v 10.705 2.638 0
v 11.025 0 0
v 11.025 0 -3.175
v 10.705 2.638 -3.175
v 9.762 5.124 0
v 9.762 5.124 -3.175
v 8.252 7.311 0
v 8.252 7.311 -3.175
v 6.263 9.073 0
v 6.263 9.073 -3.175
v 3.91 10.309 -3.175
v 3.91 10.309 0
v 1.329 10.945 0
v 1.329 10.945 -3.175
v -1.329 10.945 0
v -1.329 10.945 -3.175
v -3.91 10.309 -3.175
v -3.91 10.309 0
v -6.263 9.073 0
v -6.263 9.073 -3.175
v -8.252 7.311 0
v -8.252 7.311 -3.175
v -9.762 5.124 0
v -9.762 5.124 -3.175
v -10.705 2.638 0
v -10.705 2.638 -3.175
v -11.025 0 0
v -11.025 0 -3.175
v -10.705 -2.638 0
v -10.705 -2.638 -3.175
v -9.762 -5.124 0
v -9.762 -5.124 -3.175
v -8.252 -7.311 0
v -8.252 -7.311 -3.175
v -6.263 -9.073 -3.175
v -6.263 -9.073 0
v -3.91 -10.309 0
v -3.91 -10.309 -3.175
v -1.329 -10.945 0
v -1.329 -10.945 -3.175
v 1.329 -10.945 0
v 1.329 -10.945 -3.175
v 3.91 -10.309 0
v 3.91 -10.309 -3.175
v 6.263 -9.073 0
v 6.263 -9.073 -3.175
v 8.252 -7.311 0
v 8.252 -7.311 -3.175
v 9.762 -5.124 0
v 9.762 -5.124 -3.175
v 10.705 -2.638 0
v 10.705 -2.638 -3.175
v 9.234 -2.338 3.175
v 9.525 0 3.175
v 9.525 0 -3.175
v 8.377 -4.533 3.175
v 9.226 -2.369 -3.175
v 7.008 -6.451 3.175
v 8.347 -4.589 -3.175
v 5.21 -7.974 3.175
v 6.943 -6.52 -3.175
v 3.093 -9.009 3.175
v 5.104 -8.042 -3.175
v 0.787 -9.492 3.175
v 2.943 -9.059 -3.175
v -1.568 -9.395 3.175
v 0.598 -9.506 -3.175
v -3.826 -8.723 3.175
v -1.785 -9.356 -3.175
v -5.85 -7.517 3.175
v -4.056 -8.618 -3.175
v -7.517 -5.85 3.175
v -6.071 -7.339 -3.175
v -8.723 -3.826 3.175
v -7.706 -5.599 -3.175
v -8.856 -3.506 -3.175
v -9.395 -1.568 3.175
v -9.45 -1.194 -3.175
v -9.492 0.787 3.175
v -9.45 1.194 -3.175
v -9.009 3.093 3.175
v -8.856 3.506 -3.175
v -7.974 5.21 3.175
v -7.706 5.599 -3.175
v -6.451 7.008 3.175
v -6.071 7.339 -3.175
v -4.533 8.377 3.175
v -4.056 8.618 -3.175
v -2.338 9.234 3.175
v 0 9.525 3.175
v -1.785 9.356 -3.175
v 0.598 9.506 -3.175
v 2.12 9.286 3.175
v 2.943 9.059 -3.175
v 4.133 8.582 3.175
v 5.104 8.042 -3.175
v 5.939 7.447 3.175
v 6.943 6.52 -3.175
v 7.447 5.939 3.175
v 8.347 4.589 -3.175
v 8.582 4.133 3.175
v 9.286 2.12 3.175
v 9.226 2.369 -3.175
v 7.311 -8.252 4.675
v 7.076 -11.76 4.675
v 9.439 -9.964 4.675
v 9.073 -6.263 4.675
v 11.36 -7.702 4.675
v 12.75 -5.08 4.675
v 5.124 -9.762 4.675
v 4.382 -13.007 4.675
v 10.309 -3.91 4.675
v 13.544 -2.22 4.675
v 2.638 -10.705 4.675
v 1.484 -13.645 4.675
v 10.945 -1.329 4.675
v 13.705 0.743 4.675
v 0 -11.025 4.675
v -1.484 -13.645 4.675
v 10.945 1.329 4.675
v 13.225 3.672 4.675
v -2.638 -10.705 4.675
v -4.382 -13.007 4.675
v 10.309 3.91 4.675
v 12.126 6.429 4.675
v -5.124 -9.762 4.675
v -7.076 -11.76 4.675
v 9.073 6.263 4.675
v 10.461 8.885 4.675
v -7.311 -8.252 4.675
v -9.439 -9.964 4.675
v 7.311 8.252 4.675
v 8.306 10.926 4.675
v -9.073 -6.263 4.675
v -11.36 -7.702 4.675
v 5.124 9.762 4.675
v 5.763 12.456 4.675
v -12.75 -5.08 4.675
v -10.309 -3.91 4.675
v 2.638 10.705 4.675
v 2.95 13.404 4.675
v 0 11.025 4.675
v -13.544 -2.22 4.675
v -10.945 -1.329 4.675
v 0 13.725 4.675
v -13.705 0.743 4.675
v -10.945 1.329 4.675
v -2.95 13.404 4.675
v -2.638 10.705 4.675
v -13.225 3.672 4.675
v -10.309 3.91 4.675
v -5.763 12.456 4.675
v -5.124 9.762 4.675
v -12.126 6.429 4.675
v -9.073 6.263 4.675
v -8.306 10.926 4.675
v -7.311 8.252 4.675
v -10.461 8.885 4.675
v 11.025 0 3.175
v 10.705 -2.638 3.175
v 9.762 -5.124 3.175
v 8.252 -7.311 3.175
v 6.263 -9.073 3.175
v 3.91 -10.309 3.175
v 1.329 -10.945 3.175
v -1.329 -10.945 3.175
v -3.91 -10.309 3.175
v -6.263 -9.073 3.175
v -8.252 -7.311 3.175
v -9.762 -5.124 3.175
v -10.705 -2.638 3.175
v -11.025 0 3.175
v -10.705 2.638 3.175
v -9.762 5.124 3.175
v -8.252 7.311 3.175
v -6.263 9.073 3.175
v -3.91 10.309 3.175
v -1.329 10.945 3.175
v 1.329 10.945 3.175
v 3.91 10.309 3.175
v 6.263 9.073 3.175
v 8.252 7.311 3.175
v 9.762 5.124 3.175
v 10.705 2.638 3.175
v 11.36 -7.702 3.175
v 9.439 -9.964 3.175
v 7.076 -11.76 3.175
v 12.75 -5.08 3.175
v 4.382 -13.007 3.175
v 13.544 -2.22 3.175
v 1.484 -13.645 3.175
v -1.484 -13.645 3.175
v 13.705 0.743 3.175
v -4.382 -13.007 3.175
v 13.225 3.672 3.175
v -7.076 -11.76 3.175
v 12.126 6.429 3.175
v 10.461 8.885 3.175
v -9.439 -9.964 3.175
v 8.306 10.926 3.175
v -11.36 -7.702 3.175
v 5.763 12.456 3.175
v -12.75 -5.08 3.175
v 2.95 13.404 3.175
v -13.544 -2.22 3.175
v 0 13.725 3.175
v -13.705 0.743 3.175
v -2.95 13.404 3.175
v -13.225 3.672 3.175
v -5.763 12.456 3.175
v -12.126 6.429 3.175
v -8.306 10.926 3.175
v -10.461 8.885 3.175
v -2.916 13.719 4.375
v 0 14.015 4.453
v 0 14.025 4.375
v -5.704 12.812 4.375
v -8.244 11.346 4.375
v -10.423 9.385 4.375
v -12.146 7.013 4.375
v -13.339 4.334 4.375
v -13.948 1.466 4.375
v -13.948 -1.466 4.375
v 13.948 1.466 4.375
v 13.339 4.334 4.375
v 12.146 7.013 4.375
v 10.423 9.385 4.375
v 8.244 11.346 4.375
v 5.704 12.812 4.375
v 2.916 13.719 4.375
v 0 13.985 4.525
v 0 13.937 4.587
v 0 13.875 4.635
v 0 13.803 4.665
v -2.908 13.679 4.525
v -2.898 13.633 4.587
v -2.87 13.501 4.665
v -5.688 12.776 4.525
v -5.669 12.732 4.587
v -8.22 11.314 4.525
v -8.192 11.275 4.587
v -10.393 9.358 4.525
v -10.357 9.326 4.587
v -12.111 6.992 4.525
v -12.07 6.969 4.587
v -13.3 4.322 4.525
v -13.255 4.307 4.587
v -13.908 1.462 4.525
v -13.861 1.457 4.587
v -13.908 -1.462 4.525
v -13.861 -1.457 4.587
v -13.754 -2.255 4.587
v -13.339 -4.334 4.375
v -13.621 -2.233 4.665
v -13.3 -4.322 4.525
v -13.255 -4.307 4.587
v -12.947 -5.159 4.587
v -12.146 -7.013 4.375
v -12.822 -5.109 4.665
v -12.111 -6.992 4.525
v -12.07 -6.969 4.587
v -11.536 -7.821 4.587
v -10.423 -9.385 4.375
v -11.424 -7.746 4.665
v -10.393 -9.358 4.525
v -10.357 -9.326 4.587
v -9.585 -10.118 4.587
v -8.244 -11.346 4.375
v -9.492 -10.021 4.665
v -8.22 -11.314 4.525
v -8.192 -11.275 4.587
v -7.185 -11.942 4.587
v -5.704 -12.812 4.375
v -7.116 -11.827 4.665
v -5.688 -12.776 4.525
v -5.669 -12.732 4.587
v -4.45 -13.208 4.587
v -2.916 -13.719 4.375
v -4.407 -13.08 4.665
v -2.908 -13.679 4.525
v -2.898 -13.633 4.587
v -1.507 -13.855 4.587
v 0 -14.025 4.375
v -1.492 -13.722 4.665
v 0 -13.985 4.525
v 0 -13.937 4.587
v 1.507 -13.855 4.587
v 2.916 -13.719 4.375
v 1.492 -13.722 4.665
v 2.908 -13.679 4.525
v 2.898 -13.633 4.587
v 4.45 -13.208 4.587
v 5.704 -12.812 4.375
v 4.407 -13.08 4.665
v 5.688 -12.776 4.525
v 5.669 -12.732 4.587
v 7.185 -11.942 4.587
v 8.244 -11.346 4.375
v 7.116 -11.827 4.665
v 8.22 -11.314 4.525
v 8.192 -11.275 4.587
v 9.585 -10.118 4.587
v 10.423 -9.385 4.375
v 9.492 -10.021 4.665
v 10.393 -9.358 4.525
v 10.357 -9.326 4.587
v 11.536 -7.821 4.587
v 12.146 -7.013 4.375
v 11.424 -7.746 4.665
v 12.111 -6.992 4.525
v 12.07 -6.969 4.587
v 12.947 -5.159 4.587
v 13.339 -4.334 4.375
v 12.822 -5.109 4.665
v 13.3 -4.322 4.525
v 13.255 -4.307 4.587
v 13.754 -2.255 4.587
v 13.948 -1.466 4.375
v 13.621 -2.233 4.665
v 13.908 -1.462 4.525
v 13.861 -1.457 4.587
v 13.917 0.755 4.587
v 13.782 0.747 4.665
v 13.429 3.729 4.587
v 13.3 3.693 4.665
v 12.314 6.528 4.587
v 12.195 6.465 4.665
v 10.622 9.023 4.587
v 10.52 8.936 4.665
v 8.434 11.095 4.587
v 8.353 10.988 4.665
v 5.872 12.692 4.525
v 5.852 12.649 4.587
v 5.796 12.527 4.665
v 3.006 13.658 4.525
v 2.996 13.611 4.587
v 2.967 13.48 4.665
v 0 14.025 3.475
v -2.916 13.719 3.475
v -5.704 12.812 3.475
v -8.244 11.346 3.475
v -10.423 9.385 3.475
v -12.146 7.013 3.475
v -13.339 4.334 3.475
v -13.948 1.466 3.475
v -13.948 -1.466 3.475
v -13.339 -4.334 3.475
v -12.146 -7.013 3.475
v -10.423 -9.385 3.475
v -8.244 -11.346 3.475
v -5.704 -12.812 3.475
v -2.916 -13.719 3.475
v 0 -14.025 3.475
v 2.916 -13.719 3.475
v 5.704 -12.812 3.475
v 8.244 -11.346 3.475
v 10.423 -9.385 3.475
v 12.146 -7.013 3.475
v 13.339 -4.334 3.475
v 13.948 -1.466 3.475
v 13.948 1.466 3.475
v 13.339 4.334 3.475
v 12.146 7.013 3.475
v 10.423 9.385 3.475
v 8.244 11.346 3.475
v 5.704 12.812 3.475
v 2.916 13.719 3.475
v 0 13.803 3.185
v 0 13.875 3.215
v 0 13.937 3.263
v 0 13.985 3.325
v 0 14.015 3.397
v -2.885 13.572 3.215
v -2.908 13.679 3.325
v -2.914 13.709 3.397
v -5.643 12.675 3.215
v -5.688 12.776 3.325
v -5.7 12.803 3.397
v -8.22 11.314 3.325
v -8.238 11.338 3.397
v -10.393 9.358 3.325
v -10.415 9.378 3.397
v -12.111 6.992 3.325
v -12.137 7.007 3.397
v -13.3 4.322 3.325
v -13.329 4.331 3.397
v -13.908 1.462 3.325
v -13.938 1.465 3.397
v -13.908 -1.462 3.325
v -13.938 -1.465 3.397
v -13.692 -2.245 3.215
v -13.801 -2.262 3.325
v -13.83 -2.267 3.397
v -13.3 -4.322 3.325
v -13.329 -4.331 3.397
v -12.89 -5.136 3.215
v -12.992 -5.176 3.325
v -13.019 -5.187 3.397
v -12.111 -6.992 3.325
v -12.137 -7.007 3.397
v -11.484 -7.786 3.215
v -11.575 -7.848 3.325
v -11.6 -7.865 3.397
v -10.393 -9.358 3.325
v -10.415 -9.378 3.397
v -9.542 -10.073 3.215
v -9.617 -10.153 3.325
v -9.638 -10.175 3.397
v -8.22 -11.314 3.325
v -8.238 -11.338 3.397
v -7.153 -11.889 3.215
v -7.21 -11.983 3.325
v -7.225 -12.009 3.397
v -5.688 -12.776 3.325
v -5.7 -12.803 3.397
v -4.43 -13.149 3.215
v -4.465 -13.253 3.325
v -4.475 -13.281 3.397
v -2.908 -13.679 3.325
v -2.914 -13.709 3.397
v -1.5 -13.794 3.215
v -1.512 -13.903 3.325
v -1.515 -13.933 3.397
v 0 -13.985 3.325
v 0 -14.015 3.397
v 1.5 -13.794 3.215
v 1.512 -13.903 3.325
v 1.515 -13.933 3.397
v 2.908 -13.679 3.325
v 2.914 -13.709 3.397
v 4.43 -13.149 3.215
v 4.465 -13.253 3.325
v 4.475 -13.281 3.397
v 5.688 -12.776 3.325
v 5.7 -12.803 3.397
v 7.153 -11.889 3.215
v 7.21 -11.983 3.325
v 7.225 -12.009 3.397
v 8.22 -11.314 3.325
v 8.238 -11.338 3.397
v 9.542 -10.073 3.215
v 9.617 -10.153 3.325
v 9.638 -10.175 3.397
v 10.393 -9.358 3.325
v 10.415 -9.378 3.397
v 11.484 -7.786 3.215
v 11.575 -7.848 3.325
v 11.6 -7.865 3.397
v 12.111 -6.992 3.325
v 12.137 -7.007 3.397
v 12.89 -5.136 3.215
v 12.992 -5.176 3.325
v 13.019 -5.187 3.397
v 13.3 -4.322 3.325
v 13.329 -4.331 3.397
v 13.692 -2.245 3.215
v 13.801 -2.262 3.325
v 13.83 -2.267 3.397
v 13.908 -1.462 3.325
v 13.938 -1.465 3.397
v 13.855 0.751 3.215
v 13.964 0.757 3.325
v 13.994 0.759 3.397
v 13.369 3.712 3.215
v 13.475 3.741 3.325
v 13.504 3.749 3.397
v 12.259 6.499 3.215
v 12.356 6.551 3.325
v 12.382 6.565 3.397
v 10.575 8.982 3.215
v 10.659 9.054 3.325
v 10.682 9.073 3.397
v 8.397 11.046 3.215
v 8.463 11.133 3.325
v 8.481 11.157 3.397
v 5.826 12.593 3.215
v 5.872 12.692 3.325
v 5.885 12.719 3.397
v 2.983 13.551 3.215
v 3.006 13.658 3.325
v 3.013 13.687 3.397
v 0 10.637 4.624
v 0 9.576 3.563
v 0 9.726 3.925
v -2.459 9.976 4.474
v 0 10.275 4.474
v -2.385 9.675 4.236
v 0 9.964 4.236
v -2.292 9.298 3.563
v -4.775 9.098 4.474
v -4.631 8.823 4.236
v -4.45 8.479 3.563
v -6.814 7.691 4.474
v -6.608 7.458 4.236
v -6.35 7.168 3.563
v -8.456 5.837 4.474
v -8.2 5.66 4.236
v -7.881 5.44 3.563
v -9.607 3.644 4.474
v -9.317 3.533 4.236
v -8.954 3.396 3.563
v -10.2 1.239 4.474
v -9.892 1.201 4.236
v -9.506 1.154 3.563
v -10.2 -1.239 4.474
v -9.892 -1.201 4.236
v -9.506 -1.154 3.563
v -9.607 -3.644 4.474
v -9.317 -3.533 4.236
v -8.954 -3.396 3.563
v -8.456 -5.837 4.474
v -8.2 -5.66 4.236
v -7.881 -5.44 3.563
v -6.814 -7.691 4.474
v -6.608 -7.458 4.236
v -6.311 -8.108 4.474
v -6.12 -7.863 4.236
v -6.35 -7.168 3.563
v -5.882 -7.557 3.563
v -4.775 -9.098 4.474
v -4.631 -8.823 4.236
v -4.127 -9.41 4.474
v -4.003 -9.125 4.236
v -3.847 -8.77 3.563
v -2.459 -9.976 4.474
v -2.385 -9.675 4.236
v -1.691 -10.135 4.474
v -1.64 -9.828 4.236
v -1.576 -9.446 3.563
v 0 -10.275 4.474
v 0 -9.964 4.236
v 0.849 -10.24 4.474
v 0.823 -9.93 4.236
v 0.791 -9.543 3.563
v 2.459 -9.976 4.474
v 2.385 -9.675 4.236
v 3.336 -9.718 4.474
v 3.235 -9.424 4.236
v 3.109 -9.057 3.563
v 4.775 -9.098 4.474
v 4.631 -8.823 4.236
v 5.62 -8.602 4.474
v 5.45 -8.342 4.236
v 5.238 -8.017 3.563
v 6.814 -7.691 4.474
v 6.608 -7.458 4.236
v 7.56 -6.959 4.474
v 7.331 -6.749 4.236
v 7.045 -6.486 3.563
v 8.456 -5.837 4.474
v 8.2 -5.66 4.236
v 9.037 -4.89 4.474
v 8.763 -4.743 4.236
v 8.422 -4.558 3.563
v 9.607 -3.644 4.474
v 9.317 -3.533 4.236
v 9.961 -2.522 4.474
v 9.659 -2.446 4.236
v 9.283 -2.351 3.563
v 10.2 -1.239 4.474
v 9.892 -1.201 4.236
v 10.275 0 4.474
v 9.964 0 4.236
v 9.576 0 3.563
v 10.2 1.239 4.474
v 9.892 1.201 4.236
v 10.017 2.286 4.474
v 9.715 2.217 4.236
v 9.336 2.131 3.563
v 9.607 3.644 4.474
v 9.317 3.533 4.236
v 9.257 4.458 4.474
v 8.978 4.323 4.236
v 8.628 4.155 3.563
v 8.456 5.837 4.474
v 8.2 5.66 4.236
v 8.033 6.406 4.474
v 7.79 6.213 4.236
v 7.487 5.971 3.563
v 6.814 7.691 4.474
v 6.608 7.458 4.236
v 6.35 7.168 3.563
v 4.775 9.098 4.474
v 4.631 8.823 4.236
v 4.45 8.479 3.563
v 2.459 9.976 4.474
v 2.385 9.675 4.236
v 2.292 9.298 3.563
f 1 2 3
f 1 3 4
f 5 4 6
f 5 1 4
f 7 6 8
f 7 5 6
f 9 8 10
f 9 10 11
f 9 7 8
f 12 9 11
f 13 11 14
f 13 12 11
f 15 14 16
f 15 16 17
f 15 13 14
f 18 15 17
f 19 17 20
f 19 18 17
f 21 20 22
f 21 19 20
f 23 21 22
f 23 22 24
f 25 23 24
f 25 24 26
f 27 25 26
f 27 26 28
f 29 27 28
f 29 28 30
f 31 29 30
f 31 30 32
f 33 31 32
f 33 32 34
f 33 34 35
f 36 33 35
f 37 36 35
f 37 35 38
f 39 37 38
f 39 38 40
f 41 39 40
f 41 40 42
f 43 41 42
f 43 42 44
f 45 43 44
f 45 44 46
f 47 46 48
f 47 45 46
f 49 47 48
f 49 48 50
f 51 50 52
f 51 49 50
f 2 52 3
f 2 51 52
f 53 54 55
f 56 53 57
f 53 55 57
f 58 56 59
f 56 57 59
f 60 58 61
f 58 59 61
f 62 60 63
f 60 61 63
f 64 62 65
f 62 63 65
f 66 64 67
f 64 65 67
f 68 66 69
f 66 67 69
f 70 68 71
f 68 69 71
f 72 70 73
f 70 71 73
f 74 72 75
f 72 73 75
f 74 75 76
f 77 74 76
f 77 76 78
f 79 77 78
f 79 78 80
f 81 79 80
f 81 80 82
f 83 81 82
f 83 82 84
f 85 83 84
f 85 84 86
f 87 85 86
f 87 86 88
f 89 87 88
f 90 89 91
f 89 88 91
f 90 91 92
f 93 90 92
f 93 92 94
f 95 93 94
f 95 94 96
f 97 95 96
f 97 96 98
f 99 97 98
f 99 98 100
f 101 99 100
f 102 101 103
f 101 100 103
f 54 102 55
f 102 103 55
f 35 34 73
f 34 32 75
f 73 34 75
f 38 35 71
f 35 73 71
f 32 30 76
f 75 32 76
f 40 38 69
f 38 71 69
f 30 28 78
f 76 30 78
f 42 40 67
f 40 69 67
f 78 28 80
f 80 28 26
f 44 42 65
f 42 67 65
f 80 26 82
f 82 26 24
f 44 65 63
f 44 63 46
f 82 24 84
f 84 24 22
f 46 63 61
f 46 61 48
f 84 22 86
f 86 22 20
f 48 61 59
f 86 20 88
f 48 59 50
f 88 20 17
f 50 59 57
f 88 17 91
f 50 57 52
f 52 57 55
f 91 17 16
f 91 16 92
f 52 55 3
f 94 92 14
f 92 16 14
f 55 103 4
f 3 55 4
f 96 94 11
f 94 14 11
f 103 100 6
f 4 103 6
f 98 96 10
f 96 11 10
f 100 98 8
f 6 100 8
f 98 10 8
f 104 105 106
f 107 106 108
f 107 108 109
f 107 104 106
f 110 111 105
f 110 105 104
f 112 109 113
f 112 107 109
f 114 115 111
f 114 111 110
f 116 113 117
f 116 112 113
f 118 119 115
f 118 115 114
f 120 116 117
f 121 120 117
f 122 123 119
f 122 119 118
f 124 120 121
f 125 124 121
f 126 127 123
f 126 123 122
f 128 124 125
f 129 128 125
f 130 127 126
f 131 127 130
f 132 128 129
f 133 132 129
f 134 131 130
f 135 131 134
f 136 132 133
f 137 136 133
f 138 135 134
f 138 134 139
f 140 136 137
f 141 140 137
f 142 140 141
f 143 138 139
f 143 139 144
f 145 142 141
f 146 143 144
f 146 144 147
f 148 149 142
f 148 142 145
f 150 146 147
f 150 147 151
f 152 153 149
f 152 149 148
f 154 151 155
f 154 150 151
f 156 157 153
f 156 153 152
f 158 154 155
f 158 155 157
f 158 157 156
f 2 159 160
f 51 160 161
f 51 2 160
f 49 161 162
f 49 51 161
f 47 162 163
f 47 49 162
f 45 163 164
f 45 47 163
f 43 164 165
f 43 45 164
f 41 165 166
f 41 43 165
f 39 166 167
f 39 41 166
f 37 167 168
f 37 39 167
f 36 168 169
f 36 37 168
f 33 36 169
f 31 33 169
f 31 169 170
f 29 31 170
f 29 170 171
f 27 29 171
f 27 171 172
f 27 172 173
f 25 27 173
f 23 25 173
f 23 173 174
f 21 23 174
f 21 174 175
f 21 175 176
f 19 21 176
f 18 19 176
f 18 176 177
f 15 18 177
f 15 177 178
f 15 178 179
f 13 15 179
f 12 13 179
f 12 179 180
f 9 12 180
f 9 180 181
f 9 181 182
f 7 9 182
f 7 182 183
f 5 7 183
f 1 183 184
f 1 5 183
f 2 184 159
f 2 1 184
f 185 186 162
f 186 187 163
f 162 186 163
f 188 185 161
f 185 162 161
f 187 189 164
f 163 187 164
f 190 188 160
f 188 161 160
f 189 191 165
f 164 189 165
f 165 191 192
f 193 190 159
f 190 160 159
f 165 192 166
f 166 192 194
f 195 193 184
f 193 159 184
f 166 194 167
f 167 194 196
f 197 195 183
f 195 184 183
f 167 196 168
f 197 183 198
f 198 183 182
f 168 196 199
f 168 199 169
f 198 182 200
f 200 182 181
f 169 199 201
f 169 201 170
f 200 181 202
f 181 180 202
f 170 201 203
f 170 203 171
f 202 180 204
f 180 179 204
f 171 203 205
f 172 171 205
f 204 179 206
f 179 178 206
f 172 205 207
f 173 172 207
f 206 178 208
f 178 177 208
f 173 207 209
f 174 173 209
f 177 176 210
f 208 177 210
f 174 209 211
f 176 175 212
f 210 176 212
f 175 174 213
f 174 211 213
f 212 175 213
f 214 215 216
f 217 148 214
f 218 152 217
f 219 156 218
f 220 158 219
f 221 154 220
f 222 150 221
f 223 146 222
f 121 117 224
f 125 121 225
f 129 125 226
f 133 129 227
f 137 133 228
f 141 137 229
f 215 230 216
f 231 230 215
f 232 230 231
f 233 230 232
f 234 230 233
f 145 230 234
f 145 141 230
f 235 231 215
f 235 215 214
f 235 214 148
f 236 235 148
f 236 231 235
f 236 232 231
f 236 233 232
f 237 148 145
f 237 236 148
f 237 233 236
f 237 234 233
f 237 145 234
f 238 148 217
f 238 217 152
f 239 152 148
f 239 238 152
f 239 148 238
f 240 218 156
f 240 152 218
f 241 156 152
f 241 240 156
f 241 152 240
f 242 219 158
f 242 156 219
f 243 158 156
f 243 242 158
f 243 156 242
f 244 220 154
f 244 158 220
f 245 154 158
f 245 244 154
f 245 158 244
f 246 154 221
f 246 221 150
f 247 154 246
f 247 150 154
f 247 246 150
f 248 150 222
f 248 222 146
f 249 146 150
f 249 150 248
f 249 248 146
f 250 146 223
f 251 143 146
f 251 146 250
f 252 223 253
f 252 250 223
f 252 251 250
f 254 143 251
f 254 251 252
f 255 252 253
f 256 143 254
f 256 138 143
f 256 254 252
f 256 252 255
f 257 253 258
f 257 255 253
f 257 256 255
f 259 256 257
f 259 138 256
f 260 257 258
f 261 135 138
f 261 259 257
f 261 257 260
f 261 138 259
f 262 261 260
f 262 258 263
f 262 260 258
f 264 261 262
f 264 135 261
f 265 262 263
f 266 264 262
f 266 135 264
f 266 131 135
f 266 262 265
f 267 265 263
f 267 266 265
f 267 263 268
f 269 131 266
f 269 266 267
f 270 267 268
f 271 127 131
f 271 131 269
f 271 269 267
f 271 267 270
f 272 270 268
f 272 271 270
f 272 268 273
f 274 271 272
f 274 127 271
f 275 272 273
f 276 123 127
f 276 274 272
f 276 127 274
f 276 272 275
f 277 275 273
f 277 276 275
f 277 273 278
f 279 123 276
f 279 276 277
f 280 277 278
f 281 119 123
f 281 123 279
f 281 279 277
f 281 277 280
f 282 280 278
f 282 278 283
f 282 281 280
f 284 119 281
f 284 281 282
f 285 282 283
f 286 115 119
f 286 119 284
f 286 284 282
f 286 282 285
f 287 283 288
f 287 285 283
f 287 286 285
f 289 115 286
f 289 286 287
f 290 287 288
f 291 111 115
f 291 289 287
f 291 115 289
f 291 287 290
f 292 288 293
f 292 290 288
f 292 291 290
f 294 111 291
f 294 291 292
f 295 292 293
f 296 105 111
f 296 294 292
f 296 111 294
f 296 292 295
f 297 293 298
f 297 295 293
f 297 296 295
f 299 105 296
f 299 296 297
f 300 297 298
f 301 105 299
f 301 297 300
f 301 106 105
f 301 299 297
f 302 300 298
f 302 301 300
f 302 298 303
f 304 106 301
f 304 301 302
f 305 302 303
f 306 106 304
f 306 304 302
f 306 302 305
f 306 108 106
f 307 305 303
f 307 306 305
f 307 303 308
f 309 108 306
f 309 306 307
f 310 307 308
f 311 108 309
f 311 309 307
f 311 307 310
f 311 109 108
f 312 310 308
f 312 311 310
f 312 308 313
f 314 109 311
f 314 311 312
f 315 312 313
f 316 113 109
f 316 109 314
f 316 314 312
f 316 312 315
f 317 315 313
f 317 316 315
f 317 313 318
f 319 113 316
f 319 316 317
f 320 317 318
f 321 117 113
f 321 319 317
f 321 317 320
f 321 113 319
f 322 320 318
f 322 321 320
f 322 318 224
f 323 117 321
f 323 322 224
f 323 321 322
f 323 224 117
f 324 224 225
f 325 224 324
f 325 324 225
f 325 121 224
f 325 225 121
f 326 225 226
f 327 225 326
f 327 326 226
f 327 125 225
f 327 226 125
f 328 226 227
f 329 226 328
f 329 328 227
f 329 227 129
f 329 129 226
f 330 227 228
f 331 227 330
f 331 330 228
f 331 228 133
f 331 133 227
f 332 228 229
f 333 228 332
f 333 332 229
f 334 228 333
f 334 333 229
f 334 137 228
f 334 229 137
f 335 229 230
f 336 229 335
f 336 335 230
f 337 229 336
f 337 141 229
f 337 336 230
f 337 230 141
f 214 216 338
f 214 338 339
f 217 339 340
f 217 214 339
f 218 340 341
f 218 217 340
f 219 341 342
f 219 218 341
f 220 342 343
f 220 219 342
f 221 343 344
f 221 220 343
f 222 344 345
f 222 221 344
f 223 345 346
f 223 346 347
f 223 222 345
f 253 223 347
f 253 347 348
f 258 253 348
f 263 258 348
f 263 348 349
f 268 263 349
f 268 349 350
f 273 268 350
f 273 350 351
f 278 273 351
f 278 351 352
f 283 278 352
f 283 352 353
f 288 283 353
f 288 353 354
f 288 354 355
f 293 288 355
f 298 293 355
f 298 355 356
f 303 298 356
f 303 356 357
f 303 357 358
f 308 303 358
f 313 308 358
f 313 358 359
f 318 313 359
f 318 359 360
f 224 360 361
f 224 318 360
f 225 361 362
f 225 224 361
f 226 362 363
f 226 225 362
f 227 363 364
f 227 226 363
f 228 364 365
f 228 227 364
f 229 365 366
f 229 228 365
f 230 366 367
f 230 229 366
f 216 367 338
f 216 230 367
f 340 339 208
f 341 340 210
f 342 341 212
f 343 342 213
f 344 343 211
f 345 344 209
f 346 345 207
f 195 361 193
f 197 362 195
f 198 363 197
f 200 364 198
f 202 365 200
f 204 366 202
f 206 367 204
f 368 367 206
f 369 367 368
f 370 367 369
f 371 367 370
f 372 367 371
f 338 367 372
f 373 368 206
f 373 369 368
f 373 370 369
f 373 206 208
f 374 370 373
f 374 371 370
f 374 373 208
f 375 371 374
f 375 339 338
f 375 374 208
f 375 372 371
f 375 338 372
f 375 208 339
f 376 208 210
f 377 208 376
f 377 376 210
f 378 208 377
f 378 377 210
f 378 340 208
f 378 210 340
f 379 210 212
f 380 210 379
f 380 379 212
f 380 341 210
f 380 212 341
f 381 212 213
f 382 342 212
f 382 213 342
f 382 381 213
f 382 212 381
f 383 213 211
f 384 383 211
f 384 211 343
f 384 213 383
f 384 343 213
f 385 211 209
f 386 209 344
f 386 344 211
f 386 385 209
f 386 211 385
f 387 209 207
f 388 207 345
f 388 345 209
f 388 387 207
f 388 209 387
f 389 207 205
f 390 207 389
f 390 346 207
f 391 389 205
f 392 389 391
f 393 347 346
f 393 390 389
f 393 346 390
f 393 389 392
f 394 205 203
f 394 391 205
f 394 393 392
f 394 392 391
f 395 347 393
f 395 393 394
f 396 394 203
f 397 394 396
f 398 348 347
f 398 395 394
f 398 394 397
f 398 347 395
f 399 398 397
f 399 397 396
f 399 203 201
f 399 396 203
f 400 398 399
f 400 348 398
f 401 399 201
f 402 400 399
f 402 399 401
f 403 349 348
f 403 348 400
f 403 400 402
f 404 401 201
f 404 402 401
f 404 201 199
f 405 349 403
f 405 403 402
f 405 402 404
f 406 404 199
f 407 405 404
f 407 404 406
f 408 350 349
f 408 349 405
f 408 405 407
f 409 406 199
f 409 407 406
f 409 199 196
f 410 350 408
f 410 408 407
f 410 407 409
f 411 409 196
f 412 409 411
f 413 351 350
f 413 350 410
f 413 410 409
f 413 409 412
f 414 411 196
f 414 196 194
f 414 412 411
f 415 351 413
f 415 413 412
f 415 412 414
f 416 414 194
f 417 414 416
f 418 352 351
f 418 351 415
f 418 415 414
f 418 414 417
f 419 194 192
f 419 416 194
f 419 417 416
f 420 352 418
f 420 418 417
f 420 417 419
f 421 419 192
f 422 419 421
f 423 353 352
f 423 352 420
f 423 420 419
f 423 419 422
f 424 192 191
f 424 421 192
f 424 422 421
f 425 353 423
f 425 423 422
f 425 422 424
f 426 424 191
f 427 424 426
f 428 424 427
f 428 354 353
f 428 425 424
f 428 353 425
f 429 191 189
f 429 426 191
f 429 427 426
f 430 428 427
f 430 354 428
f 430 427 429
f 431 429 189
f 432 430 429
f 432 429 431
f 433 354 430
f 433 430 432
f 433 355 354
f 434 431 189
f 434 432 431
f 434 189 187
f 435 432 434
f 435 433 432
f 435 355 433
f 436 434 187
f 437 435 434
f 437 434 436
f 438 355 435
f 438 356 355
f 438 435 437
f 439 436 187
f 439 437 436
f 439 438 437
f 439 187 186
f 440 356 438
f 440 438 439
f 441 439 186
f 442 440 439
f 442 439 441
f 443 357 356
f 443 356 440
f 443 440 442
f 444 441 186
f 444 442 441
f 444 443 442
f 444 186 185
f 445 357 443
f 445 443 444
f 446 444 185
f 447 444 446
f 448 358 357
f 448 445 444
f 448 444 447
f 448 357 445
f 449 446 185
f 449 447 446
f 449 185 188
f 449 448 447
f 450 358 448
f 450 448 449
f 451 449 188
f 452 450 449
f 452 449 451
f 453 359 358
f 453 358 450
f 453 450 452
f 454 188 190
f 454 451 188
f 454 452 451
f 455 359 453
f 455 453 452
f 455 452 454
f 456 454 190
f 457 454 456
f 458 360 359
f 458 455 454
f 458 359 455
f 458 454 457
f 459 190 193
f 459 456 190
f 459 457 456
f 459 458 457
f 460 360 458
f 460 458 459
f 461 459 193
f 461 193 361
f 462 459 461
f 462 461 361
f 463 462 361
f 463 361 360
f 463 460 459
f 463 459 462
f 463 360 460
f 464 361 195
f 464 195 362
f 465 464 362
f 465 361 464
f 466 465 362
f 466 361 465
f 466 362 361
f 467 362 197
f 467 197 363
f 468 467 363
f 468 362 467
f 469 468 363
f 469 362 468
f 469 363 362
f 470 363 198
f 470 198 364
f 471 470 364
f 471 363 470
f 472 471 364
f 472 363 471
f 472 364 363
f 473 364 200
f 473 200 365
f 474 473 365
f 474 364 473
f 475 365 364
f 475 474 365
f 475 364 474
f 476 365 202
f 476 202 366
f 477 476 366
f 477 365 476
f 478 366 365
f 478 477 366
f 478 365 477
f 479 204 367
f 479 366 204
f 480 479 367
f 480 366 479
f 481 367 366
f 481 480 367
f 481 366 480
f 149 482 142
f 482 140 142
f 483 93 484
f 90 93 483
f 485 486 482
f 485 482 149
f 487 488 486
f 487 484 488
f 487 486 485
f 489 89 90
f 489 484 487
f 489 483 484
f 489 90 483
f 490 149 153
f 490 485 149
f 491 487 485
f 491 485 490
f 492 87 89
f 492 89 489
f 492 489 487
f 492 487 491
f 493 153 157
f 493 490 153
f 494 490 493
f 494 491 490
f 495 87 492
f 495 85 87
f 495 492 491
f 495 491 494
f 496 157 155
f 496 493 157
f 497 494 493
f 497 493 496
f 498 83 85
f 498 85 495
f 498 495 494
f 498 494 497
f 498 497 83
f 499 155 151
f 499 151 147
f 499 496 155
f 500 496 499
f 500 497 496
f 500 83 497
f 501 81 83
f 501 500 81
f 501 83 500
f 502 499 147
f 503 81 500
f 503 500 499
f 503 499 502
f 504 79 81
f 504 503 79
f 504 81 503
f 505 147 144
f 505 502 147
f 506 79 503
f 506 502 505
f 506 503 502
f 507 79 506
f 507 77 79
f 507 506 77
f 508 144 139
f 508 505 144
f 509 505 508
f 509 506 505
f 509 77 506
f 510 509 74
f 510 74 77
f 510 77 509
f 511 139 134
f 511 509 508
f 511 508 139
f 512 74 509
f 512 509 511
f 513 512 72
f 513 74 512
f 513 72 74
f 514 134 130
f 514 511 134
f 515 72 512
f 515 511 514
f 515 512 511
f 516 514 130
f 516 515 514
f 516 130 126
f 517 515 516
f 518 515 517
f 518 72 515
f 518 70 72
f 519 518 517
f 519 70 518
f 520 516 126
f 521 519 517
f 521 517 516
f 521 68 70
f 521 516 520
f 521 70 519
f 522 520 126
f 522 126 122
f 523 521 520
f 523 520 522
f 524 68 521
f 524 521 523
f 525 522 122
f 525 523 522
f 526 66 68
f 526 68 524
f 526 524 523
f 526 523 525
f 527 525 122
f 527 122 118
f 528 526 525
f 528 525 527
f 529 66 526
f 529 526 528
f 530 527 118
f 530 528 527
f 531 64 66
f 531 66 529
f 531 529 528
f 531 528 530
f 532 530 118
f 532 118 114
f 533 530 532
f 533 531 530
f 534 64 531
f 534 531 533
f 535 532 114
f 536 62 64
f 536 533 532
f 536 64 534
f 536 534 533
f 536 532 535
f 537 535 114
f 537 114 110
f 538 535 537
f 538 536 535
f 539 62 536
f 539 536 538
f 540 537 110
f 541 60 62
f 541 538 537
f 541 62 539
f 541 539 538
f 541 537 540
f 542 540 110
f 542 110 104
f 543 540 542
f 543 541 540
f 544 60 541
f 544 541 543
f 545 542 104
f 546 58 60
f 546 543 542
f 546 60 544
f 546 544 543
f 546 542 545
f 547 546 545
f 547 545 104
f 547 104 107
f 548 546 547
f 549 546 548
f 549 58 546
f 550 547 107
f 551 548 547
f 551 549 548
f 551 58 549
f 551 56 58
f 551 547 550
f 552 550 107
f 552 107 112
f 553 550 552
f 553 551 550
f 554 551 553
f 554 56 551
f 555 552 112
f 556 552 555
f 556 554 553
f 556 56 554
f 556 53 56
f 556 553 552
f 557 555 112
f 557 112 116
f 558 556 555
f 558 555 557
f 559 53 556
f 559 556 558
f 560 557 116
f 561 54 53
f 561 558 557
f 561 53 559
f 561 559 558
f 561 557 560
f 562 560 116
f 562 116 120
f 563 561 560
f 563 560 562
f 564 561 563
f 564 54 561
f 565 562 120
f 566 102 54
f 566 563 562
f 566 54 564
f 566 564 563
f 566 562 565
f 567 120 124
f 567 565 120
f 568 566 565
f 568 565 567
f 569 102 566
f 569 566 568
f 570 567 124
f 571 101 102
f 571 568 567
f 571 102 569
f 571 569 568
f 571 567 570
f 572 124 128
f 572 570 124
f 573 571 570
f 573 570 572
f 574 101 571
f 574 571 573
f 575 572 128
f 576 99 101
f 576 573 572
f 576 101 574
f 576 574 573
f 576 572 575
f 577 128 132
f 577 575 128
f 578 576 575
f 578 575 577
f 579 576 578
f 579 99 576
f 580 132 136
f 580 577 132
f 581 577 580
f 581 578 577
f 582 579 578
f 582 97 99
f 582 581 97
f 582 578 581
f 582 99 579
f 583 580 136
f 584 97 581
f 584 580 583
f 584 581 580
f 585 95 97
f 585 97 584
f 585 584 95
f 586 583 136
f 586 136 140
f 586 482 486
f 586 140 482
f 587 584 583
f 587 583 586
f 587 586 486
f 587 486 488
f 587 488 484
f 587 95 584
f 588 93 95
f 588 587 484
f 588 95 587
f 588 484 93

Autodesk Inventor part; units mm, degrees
ref_plane "YZ Plane" through (0, 0, 0) normal (1, 0, 0) x (0, 1, 0)
ref_plane "XZ Plane" through (0, 0, 0) normal (0, 1, 0) x (-1, 0, 0)
ref_plane "XY Plane" through (0, 0, 0) normal (0, 0, 1) x (1, 0, 0)
sketch "Boceto1" plane through (0, 0, 0) normal (0, 0, 1) x (1, 0, 0)
  circle A0 centre (0, 0) radius 9.525
  circle A1 centre (0, 0) radius 11.025
  dimension "d0" = 19.05
  dimension "d1" = 22.05
extrude "Extrusión1" add sketch "Boceto1" along normal mid plane 6.35
sketch "Boceto2" plane through (0, 0, 0) normal (1, 0, 0) x (0, 1, 0)
  line L0 (11.025, 3.175) -> (13.725, 3.175)
  line L1 (14.025, 3.475) -> (14.025, 4.375)
  line L2 (13.725, 4.675) -> (11.025, 4.675)
  arc A0 (11.025, 4.675) -> (9.525, 3.175) centre (11.025, 3.175) ccw
  arc A1 (13.725, 3.175) -> (14.025, 3.475) centre (13.725, 3.475) ccw
  arc A2 (14.025, 4.375) -> (13.725, 4.675) centre (13.725, 4.375) ccw
  line L3 (11.025, 3.175) -> (9.525, 3.175)
  line L4 (0, -0.9971) -> (0, 5.9828) projected
  point P0 (0, 0)
  point P1 (14.025, 3.175)
  point P2 (14.025, 4.675)
  dimension "d4" = 3
  dimension "d5" = 1.5
  dimension "d6" = 3
  dimension "d7" = 0.3
revolve "Revolución1" add sketch "Boceto2" angle 360 about axis through (0, 0, -10) along (0, 0, 1)
properties part number "Buje soporte superior"
